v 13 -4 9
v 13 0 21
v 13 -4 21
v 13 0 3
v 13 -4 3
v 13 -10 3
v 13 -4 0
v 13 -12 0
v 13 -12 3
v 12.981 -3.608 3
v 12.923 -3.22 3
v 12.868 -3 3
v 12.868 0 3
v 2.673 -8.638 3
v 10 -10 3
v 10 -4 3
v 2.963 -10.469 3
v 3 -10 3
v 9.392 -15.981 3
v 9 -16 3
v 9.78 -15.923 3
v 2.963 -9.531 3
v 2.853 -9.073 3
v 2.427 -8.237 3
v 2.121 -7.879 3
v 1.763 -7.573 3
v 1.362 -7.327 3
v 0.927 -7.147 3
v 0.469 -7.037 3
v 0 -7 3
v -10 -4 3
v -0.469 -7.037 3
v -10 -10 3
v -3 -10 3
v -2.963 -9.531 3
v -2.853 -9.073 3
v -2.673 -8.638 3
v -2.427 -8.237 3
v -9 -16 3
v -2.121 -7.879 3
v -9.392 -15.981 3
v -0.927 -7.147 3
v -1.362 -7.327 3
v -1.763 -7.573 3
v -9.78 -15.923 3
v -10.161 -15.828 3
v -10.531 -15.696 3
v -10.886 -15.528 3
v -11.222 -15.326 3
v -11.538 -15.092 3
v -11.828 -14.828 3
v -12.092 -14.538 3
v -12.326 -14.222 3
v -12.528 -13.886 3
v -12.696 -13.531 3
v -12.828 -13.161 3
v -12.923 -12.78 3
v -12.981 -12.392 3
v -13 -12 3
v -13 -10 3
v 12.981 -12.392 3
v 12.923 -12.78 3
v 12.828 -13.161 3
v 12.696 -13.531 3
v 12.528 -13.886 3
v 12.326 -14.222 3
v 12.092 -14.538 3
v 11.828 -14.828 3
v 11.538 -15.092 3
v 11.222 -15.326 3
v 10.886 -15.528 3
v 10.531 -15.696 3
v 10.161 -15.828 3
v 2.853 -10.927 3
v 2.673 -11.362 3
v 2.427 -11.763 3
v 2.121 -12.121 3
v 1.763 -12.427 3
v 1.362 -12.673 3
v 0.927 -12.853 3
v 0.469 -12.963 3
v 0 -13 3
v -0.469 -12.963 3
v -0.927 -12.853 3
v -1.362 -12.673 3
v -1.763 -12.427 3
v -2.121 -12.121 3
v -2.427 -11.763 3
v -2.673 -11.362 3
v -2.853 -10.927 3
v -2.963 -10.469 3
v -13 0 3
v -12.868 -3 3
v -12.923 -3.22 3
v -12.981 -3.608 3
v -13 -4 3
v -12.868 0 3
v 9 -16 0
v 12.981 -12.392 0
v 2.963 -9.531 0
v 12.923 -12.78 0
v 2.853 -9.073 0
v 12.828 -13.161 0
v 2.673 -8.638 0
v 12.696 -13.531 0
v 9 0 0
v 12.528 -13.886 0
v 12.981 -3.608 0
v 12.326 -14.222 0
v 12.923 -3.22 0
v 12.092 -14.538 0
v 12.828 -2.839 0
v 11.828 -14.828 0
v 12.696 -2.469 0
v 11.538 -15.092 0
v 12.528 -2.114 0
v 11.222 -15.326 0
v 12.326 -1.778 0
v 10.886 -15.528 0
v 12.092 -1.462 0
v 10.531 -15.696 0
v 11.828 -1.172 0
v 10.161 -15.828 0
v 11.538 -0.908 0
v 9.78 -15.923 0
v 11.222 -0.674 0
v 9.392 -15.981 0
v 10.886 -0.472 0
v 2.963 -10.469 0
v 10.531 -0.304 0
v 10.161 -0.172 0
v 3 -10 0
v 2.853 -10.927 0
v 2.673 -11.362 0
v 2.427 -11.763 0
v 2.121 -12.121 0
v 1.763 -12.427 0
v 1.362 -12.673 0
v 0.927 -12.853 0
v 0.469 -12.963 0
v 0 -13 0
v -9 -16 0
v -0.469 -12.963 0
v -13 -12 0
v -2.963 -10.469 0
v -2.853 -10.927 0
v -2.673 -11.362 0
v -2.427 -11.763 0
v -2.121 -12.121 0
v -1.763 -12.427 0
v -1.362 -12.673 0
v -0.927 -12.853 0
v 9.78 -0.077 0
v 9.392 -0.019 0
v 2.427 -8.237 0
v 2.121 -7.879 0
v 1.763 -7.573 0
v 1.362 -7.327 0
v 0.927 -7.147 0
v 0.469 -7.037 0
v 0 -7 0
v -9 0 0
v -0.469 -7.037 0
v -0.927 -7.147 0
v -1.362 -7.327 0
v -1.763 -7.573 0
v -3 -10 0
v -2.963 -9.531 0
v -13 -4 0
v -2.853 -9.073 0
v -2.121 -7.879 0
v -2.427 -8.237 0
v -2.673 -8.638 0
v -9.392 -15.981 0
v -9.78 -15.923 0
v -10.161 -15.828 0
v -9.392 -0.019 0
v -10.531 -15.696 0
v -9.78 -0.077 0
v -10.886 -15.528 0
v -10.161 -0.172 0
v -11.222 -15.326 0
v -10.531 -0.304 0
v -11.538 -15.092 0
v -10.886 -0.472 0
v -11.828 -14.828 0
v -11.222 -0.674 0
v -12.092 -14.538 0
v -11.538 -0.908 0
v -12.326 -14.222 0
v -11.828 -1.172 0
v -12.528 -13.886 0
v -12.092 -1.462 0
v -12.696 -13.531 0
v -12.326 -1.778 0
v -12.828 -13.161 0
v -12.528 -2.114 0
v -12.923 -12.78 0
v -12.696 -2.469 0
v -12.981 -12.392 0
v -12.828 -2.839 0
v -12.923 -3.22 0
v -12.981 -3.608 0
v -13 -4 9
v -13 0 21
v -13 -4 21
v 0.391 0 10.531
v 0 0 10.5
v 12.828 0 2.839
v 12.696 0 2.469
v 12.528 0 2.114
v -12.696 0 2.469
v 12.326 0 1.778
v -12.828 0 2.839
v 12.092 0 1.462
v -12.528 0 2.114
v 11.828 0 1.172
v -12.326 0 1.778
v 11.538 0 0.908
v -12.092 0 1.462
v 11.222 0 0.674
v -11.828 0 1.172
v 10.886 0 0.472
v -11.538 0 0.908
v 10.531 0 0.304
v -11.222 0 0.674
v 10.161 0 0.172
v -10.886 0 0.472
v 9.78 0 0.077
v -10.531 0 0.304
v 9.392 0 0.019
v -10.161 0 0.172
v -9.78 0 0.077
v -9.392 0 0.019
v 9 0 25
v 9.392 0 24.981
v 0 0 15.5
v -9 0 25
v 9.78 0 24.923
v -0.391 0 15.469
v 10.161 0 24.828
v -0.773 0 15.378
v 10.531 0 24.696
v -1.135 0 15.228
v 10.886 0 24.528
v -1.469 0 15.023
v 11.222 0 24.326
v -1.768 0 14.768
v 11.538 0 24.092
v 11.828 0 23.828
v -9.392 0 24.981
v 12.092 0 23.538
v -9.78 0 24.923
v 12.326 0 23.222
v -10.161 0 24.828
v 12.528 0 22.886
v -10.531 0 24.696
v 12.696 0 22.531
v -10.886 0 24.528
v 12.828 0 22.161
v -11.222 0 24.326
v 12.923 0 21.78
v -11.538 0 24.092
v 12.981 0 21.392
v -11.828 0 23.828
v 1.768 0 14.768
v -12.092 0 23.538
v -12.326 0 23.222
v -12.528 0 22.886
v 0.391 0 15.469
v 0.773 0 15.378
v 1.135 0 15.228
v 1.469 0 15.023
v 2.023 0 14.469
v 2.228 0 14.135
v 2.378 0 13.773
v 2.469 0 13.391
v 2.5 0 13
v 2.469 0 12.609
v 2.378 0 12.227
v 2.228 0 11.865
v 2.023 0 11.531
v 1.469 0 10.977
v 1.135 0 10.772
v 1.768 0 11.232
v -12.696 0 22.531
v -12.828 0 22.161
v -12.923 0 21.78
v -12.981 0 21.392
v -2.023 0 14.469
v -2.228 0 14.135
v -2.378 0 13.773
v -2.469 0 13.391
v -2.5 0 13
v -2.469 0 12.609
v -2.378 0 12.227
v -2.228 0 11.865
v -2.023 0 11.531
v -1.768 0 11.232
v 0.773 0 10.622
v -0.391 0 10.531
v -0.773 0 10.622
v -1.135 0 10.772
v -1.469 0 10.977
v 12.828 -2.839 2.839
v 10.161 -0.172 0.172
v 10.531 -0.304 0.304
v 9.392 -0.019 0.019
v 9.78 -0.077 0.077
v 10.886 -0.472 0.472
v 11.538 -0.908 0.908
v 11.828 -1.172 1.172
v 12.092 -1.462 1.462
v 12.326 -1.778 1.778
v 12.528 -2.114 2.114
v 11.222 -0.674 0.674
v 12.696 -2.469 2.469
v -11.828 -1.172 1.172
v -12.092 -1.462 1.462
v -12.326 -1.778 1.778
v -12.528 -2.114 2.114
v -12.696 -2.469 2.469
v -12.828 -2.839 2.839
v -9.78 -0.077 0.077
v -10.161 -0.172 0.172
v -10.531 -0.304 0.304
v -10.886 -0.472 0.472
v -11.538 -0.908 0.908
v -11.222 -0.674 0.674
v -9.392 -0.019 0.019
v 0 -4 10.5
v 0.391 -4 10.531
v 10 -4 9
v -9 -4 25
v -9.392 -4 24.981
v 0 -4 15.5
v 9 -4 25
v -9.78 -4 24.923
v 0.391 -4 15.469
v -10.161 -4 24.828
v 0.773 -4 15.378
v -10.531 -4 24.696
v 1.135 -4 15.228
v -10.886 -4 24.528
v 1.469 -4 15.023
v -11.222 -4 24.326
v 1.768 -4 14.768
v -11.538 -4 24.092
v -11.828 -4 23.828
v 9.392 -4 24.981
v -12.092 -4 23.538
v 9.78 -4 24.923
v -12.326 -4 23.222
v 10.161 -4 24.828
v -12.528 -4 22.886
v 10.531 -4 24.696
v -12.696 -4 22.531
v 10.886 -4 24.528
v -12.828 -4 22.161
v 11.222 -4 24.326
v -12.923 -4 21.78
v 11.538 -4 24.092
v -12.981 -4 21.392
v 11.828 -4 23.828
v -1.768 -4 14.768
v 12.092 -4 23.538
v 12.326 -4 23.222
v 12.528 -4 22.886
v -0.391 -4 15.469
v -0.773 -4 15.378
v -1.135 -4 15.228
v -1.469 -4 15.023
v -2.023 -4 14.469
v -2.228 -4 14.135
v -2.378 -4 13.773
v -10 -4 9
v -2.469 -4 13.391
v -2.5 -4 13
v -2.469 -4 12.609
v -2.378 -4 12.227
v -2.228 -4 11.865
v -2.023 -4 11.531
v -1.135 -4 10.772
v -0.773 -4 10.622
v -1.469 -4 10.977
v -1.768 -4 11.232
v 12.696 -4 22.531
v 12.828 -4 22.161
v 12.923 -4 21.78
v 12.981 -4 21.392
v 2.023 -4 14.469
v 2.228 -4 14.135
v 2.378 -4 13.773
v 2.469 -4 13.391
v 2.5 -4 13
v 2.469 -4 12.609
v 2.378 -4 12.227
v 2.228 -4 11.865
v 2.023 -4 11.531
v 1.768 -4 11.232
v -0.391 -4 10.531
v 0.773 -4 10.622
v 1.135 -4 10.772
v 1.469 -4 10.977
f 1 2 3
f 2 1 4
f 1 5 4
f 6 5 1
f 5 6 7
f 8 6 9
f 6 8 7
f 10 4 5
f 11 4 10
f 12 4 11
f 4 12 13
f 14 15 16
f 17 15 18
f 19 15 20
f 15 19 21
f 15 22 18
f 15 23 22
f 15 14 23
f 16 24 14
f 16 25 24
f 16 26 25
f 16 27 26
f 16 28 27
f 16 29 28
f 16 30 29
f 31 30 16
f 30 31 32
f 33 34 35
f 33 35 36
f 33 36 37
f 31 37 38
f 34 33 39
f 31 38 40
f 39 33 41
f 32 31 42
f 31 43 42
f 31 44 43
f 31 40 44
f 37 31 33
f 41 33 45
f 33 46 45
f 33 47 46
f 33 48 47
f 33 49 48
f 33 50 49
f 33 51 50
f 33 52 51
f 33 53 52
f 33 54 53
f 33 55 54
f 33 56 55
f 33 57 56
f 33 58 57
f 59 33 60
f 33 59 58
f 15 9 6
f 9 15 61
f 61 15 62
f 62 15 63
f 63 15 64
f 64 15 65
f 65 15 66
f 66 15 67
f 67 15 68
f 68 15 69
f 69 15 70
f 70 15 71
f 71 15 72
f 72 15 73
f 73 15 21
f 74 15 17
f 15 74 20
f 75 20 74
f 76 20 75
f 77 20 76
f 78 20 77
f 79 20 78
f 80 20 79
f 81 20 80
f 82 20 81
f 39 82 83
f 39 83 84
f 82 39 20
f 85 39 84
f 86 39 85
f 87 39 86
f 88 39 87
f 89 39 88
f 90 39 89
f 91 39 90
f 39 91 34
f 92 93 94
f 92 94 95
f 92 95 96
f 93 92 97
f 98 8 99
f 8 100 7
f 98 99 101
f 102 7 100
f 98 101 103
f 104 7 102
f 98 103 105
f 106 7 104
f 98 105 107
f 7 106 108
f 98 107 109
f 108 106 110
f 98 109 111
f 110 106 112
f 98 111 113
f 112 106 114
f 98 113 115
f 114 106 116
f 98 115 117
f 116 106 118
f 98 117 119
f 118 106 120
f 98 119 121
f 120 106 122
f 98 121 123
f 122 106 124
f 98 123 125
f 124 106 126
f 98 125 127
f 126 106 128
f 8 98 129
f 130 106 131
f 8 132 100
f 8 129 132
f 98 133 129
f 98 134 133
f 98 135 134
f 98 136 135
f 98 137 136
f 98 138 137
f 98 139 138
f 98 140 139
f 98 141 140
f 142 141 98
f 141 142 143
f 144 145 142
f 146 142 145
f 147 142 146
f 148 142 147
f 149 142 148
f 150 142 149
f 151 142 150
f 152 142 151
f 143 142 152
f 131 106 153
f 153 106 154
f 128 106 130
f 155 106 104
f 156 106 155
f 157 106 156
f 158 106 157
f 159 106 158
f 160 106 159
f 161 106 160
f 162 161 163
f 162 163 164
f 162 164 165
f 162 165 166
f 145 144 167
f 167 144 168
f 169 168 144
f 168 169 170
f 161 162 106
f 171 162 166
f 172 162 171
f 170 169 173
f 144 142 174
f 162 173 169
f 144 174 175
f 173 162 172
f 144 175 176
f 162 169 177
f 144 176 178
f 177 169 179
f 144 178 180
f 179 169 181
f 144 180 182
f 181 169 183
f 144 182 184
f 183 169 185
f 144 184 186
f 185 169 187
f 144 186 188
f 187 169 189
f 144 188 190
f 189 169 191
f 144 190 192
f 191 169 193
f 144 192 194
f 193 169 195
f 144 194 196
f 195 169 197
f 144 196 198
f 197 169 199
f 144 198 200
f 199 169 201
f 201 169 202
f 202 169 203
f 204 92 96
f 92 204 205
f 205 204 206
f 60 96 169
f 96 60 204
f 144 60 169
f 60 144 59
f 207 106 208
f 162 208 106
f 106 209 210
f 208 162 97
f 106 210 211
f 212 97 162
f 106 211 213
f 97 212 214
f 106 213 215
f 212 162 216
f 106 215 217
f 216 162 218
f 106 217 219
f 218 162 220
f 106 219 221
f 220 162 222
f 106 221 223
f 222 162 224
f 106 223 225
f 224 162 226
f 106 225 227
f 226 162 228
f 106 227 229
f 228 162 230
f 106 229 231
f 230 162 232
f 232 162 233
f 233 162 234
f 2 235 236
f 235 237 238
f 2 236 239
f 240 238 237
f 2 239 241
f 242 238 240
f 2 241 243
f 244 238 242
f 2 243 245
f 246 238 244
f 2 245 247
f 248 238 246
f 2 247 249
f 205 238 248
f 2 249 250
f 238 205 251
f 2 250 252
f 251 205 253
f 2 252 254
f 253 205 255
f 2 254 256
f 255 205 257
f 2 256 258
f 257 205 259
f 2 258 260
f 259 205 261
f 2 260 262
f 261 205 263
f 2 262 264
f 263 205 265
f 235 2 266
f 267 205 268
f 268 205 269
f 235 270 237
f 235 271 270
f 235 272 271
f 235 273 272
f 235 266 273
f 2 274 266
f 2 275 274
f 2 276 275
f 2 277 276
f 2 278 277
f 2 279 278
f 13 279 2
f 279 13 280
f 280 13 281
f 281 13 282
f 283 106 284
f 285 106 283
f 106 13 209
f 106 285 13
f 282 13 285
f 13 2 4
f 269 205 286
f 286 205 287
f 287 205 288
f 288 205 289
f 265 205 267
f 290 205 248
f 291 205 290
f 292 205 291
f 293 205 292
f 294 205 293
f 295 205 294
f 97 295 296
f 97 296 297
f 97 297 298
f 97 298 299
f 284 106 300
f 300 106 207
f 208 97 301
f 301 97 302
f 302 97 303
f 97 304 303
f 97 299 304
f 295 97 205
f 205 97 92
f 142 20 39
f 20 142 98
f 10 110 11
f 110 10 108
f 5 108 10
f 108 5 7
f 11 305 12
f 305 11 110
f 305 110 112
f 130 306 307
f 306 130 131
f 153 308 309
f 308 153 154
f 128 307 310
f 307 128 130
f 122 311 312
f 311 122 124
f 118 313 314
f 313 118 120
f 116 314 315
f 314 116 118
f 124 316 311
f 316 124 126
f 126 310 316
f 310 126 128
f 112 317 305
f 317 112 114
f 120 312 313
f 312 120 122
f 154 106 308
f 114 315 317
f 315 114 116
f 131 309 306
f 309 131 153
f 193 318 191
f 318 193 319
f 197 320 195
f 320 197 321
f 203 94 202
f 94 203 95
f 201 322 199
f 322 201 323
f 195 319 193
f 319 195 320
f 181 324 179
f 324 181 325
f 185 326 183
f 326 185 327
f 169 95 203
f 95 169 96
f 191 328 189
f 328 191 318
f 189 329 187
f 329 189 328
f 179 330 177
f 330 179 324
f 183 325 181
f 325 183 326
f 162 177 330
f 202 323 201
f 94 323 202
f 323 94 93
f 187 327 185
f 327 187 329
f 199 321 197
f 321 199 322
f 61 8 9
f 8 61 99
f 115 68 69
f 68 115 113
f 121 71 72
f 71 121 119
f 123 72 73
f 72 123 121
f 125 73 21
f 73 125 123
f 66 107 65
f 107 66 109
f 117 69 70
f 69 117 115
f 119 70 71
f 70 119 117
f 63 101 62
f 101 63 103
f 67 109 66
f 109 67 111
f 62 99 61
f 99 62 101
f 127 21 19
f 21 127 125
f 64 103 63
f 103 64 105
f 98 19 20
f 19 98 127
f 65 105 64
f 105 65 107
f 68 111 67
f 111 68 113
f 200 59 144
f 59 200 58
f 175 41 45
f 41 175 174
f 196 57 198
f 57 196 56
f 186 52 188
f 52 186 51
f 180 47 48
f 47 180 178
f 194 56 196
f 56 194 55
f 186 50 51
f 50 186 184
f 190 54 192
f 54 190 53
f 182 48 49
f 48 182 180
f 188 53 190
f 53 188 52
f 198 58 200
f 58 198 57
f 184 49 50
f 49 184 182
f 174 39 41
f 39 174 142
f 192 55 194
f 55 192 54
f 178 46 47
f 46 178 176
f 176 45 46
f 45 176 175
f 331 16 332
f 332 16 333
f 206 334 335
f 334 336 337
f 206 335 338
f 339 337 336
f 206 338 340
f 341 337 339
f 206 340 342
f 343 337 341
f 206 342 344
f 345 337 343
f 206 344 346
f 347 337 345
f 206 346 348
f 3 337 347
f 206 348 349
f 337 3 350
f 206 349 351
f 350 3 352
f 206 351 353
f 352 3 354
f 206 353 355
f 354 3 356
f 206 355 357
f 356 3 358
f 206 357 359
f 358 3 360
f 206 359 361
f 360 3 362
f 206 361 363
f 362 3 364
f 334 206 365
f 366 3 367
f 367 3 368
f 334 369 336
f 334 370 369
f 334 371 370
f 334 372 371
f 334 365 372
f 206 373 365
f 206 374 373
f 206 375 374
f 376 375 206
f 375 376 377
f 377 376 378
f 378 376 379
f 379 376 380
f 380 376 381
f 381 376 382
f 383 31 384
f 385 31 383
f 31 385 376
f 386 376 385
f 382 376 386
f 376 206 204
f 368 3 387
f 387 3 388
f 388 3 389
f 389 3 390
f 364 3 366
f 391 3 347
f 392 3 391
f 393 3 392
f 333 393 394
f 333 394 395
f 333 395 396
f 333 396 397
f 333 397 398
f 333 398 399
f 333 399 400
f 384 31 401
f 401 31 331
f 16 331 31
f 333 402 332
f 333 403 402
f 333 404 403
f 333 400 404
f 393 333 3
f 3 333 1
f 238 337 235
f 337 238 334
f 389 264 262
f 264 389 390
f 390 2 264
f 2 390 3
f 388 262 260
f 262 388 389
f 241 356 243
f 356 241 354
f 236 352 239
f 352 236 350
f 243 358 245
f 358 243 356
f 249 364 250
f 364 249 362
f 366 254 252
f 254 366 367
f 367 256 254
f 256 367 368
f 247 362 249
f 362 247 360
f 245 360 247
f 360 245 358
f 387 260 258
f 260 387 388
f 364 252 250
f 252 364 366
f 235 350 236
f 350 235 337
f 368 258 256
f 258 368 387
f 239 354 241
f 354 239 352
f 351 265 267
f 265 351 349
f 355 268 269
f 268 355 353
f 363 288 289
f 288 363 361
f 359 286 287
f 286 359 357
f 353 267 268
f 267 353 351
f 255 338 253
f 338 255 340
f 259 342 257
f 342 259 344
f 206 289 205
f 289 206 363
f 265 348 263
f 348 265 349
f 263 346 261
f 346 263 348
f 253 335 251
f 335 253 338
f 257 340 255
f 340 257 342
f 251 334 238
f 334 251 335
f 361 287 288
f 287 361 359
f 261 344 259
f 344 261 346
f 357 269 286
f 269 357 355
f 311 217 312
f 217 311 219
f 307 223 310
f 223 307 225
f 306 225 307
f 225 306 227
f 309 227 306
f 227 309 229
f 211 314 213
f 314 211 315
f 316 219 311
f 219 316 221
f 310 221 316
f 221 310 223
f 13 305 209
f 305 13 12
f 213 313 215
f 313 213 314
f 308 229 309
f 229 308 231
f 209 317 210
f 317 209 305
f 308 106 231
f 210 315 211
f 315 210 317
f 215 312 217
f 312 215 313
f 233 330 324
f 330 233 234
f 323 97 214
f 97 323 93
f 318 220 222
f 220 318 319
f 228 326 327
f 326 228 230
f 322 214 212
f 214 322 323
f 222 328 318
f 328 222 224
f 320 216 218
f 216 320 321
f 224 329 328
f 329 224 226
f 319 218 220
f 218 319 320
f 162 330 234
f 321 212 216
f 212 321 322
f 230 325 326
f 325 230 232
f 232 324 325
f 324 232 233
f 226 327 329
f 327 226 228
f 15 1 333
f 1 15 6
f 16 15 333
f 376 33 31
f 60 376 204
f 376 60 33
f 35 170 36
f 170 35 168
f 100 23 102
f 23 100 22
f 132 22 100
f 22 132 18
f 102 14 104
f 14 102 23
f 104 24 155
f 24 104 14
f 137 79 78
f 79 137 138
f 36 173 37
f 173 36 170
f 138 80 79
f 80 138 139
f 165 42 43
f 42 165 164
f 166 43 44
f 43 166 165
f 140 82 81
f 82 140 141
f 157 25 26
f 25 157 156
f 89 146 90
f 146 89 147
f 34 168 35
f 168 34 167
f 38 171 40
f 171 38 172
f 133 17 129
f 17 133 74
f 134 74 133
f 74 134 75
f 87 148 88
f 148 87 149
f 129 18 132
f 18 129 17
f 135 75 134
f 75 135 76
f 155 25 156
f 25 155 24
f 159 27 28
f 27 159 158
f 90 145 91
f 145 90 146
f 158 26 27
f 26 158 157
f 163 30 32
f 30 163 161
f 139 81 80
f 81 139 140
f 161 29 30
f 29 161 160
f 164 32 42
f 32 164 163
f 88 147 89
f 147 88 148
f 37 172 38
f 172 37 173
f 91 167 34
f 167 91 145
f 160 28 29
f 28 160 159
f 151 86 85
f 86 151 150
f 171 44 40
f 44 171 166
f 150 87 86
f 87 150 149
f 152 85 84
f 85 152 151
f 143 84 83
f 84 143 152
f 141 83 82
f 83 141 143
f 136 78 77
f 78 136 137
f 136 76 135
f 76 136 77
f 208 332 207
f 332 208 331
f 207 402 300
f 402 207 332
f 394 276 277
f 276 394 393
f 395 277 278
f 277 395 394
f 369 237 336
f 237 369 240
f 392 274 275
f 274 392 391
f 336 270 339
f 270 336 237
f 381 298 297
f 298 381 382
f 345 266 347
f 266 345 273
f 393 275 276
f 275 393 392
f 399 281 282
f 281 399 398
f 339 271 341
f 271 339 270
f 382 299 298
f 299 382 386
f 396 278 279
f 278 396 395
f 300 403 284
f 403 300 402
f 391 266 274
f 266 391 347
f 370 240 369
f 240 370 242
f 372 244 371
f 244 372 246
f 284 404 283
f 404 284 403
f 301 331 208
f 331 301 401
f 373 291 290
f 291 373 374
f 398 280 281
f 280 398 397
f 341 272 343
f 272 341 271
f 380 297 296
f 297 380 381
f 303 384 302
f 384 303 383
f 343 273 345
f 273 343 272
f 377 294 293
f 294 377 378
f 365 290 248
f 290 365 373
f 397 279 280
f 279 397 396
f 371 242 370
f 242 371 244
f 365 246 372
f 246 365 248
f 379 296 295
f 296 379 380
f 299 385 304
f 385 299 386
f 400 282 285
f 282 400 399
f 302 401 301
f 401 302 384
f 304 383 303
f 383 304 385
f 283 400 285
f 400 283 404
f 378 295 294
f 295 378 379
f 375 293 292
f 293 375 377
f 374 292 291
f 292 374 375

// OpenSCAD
difference()
{
    union()
    {
        translate([0,-16/2,3/2])
        rounded_box(26,16,3,4,$fn=64);
        
        translate([0,0,0])
        rotate([90,0,0])
        translate([0,25/2,4/2])
        rounded_box(26,25,4,4,$fn=64);
        
        translate([10+3/2,-5,3])
        rotate([0,0,-90])
        ramp(10,3,10,0);
        
        translate([-(10+3/2),-5,3])
        rotate([0,0,-90])
        ramp(10,3,10,0);
    }
    
    
    translate([0,-20+10,-1])
    cylinder(d=6,h=7,$fn=40);
    
    translate([0,0,12.8+0.2])
    rotate([90,0,0])
    translate([0,0,-1])
    cylinder(d=5,h=7,$fn=40);
    
}

module stretched_cylinder(d, h, stretch, center=false)
{
  if (center)
    stretched_cylinder_geom(d=d, h=h, stretch=stretch);
  else
    translate([0,0,h/2])
    stretched_cylinder_geom(d=d, h=h, stretch=stretch);
}

module stretched_cylinder_geom(d, h, stretch)
{
    union()
    {
        translate([stretch/2,0,0])
        cylinder(d=d,h=h,center=true);
        
        translate([-stretch/2,0,0])
        cylinder(d=d,h=h,center=true);
        
        cube([stretch,d,h],center=true);
    }
}

module ramp(x,y,z1,z2)
{
    rotate([90,0,0])
    translate([0,0,-y/2])
    linear_extrude(height=y)
    {
        polygon(points=[[-x/2,0],[-x/2,z1],[x/2,z2],[x/2,0]]);
    }
}

module rounded_box(x,y,z,radius,$fn=$fn)
{
    union()
    {
        cube([x,y-2*radius,z],center=true);
        cube([x-2*radius,y,z],center=true);
        
        translate([(x/2-radius),(y/2-radius),0])
        cylinder(r=radius,h=z,center=true);
        
        translate([-(x/2-radius),(y/2-radius),0])
        cylinder(r=radius,h=z,center=true);
        
        translate([(x/2-radius),-(y/2-radius),0])
        cylinder(r=radius,h=z,center=true);
        
        translate([-(x/2-radius),-(y/2-radius),0])
        cylinder(r=radius,h=z,center=true);
    }
}
